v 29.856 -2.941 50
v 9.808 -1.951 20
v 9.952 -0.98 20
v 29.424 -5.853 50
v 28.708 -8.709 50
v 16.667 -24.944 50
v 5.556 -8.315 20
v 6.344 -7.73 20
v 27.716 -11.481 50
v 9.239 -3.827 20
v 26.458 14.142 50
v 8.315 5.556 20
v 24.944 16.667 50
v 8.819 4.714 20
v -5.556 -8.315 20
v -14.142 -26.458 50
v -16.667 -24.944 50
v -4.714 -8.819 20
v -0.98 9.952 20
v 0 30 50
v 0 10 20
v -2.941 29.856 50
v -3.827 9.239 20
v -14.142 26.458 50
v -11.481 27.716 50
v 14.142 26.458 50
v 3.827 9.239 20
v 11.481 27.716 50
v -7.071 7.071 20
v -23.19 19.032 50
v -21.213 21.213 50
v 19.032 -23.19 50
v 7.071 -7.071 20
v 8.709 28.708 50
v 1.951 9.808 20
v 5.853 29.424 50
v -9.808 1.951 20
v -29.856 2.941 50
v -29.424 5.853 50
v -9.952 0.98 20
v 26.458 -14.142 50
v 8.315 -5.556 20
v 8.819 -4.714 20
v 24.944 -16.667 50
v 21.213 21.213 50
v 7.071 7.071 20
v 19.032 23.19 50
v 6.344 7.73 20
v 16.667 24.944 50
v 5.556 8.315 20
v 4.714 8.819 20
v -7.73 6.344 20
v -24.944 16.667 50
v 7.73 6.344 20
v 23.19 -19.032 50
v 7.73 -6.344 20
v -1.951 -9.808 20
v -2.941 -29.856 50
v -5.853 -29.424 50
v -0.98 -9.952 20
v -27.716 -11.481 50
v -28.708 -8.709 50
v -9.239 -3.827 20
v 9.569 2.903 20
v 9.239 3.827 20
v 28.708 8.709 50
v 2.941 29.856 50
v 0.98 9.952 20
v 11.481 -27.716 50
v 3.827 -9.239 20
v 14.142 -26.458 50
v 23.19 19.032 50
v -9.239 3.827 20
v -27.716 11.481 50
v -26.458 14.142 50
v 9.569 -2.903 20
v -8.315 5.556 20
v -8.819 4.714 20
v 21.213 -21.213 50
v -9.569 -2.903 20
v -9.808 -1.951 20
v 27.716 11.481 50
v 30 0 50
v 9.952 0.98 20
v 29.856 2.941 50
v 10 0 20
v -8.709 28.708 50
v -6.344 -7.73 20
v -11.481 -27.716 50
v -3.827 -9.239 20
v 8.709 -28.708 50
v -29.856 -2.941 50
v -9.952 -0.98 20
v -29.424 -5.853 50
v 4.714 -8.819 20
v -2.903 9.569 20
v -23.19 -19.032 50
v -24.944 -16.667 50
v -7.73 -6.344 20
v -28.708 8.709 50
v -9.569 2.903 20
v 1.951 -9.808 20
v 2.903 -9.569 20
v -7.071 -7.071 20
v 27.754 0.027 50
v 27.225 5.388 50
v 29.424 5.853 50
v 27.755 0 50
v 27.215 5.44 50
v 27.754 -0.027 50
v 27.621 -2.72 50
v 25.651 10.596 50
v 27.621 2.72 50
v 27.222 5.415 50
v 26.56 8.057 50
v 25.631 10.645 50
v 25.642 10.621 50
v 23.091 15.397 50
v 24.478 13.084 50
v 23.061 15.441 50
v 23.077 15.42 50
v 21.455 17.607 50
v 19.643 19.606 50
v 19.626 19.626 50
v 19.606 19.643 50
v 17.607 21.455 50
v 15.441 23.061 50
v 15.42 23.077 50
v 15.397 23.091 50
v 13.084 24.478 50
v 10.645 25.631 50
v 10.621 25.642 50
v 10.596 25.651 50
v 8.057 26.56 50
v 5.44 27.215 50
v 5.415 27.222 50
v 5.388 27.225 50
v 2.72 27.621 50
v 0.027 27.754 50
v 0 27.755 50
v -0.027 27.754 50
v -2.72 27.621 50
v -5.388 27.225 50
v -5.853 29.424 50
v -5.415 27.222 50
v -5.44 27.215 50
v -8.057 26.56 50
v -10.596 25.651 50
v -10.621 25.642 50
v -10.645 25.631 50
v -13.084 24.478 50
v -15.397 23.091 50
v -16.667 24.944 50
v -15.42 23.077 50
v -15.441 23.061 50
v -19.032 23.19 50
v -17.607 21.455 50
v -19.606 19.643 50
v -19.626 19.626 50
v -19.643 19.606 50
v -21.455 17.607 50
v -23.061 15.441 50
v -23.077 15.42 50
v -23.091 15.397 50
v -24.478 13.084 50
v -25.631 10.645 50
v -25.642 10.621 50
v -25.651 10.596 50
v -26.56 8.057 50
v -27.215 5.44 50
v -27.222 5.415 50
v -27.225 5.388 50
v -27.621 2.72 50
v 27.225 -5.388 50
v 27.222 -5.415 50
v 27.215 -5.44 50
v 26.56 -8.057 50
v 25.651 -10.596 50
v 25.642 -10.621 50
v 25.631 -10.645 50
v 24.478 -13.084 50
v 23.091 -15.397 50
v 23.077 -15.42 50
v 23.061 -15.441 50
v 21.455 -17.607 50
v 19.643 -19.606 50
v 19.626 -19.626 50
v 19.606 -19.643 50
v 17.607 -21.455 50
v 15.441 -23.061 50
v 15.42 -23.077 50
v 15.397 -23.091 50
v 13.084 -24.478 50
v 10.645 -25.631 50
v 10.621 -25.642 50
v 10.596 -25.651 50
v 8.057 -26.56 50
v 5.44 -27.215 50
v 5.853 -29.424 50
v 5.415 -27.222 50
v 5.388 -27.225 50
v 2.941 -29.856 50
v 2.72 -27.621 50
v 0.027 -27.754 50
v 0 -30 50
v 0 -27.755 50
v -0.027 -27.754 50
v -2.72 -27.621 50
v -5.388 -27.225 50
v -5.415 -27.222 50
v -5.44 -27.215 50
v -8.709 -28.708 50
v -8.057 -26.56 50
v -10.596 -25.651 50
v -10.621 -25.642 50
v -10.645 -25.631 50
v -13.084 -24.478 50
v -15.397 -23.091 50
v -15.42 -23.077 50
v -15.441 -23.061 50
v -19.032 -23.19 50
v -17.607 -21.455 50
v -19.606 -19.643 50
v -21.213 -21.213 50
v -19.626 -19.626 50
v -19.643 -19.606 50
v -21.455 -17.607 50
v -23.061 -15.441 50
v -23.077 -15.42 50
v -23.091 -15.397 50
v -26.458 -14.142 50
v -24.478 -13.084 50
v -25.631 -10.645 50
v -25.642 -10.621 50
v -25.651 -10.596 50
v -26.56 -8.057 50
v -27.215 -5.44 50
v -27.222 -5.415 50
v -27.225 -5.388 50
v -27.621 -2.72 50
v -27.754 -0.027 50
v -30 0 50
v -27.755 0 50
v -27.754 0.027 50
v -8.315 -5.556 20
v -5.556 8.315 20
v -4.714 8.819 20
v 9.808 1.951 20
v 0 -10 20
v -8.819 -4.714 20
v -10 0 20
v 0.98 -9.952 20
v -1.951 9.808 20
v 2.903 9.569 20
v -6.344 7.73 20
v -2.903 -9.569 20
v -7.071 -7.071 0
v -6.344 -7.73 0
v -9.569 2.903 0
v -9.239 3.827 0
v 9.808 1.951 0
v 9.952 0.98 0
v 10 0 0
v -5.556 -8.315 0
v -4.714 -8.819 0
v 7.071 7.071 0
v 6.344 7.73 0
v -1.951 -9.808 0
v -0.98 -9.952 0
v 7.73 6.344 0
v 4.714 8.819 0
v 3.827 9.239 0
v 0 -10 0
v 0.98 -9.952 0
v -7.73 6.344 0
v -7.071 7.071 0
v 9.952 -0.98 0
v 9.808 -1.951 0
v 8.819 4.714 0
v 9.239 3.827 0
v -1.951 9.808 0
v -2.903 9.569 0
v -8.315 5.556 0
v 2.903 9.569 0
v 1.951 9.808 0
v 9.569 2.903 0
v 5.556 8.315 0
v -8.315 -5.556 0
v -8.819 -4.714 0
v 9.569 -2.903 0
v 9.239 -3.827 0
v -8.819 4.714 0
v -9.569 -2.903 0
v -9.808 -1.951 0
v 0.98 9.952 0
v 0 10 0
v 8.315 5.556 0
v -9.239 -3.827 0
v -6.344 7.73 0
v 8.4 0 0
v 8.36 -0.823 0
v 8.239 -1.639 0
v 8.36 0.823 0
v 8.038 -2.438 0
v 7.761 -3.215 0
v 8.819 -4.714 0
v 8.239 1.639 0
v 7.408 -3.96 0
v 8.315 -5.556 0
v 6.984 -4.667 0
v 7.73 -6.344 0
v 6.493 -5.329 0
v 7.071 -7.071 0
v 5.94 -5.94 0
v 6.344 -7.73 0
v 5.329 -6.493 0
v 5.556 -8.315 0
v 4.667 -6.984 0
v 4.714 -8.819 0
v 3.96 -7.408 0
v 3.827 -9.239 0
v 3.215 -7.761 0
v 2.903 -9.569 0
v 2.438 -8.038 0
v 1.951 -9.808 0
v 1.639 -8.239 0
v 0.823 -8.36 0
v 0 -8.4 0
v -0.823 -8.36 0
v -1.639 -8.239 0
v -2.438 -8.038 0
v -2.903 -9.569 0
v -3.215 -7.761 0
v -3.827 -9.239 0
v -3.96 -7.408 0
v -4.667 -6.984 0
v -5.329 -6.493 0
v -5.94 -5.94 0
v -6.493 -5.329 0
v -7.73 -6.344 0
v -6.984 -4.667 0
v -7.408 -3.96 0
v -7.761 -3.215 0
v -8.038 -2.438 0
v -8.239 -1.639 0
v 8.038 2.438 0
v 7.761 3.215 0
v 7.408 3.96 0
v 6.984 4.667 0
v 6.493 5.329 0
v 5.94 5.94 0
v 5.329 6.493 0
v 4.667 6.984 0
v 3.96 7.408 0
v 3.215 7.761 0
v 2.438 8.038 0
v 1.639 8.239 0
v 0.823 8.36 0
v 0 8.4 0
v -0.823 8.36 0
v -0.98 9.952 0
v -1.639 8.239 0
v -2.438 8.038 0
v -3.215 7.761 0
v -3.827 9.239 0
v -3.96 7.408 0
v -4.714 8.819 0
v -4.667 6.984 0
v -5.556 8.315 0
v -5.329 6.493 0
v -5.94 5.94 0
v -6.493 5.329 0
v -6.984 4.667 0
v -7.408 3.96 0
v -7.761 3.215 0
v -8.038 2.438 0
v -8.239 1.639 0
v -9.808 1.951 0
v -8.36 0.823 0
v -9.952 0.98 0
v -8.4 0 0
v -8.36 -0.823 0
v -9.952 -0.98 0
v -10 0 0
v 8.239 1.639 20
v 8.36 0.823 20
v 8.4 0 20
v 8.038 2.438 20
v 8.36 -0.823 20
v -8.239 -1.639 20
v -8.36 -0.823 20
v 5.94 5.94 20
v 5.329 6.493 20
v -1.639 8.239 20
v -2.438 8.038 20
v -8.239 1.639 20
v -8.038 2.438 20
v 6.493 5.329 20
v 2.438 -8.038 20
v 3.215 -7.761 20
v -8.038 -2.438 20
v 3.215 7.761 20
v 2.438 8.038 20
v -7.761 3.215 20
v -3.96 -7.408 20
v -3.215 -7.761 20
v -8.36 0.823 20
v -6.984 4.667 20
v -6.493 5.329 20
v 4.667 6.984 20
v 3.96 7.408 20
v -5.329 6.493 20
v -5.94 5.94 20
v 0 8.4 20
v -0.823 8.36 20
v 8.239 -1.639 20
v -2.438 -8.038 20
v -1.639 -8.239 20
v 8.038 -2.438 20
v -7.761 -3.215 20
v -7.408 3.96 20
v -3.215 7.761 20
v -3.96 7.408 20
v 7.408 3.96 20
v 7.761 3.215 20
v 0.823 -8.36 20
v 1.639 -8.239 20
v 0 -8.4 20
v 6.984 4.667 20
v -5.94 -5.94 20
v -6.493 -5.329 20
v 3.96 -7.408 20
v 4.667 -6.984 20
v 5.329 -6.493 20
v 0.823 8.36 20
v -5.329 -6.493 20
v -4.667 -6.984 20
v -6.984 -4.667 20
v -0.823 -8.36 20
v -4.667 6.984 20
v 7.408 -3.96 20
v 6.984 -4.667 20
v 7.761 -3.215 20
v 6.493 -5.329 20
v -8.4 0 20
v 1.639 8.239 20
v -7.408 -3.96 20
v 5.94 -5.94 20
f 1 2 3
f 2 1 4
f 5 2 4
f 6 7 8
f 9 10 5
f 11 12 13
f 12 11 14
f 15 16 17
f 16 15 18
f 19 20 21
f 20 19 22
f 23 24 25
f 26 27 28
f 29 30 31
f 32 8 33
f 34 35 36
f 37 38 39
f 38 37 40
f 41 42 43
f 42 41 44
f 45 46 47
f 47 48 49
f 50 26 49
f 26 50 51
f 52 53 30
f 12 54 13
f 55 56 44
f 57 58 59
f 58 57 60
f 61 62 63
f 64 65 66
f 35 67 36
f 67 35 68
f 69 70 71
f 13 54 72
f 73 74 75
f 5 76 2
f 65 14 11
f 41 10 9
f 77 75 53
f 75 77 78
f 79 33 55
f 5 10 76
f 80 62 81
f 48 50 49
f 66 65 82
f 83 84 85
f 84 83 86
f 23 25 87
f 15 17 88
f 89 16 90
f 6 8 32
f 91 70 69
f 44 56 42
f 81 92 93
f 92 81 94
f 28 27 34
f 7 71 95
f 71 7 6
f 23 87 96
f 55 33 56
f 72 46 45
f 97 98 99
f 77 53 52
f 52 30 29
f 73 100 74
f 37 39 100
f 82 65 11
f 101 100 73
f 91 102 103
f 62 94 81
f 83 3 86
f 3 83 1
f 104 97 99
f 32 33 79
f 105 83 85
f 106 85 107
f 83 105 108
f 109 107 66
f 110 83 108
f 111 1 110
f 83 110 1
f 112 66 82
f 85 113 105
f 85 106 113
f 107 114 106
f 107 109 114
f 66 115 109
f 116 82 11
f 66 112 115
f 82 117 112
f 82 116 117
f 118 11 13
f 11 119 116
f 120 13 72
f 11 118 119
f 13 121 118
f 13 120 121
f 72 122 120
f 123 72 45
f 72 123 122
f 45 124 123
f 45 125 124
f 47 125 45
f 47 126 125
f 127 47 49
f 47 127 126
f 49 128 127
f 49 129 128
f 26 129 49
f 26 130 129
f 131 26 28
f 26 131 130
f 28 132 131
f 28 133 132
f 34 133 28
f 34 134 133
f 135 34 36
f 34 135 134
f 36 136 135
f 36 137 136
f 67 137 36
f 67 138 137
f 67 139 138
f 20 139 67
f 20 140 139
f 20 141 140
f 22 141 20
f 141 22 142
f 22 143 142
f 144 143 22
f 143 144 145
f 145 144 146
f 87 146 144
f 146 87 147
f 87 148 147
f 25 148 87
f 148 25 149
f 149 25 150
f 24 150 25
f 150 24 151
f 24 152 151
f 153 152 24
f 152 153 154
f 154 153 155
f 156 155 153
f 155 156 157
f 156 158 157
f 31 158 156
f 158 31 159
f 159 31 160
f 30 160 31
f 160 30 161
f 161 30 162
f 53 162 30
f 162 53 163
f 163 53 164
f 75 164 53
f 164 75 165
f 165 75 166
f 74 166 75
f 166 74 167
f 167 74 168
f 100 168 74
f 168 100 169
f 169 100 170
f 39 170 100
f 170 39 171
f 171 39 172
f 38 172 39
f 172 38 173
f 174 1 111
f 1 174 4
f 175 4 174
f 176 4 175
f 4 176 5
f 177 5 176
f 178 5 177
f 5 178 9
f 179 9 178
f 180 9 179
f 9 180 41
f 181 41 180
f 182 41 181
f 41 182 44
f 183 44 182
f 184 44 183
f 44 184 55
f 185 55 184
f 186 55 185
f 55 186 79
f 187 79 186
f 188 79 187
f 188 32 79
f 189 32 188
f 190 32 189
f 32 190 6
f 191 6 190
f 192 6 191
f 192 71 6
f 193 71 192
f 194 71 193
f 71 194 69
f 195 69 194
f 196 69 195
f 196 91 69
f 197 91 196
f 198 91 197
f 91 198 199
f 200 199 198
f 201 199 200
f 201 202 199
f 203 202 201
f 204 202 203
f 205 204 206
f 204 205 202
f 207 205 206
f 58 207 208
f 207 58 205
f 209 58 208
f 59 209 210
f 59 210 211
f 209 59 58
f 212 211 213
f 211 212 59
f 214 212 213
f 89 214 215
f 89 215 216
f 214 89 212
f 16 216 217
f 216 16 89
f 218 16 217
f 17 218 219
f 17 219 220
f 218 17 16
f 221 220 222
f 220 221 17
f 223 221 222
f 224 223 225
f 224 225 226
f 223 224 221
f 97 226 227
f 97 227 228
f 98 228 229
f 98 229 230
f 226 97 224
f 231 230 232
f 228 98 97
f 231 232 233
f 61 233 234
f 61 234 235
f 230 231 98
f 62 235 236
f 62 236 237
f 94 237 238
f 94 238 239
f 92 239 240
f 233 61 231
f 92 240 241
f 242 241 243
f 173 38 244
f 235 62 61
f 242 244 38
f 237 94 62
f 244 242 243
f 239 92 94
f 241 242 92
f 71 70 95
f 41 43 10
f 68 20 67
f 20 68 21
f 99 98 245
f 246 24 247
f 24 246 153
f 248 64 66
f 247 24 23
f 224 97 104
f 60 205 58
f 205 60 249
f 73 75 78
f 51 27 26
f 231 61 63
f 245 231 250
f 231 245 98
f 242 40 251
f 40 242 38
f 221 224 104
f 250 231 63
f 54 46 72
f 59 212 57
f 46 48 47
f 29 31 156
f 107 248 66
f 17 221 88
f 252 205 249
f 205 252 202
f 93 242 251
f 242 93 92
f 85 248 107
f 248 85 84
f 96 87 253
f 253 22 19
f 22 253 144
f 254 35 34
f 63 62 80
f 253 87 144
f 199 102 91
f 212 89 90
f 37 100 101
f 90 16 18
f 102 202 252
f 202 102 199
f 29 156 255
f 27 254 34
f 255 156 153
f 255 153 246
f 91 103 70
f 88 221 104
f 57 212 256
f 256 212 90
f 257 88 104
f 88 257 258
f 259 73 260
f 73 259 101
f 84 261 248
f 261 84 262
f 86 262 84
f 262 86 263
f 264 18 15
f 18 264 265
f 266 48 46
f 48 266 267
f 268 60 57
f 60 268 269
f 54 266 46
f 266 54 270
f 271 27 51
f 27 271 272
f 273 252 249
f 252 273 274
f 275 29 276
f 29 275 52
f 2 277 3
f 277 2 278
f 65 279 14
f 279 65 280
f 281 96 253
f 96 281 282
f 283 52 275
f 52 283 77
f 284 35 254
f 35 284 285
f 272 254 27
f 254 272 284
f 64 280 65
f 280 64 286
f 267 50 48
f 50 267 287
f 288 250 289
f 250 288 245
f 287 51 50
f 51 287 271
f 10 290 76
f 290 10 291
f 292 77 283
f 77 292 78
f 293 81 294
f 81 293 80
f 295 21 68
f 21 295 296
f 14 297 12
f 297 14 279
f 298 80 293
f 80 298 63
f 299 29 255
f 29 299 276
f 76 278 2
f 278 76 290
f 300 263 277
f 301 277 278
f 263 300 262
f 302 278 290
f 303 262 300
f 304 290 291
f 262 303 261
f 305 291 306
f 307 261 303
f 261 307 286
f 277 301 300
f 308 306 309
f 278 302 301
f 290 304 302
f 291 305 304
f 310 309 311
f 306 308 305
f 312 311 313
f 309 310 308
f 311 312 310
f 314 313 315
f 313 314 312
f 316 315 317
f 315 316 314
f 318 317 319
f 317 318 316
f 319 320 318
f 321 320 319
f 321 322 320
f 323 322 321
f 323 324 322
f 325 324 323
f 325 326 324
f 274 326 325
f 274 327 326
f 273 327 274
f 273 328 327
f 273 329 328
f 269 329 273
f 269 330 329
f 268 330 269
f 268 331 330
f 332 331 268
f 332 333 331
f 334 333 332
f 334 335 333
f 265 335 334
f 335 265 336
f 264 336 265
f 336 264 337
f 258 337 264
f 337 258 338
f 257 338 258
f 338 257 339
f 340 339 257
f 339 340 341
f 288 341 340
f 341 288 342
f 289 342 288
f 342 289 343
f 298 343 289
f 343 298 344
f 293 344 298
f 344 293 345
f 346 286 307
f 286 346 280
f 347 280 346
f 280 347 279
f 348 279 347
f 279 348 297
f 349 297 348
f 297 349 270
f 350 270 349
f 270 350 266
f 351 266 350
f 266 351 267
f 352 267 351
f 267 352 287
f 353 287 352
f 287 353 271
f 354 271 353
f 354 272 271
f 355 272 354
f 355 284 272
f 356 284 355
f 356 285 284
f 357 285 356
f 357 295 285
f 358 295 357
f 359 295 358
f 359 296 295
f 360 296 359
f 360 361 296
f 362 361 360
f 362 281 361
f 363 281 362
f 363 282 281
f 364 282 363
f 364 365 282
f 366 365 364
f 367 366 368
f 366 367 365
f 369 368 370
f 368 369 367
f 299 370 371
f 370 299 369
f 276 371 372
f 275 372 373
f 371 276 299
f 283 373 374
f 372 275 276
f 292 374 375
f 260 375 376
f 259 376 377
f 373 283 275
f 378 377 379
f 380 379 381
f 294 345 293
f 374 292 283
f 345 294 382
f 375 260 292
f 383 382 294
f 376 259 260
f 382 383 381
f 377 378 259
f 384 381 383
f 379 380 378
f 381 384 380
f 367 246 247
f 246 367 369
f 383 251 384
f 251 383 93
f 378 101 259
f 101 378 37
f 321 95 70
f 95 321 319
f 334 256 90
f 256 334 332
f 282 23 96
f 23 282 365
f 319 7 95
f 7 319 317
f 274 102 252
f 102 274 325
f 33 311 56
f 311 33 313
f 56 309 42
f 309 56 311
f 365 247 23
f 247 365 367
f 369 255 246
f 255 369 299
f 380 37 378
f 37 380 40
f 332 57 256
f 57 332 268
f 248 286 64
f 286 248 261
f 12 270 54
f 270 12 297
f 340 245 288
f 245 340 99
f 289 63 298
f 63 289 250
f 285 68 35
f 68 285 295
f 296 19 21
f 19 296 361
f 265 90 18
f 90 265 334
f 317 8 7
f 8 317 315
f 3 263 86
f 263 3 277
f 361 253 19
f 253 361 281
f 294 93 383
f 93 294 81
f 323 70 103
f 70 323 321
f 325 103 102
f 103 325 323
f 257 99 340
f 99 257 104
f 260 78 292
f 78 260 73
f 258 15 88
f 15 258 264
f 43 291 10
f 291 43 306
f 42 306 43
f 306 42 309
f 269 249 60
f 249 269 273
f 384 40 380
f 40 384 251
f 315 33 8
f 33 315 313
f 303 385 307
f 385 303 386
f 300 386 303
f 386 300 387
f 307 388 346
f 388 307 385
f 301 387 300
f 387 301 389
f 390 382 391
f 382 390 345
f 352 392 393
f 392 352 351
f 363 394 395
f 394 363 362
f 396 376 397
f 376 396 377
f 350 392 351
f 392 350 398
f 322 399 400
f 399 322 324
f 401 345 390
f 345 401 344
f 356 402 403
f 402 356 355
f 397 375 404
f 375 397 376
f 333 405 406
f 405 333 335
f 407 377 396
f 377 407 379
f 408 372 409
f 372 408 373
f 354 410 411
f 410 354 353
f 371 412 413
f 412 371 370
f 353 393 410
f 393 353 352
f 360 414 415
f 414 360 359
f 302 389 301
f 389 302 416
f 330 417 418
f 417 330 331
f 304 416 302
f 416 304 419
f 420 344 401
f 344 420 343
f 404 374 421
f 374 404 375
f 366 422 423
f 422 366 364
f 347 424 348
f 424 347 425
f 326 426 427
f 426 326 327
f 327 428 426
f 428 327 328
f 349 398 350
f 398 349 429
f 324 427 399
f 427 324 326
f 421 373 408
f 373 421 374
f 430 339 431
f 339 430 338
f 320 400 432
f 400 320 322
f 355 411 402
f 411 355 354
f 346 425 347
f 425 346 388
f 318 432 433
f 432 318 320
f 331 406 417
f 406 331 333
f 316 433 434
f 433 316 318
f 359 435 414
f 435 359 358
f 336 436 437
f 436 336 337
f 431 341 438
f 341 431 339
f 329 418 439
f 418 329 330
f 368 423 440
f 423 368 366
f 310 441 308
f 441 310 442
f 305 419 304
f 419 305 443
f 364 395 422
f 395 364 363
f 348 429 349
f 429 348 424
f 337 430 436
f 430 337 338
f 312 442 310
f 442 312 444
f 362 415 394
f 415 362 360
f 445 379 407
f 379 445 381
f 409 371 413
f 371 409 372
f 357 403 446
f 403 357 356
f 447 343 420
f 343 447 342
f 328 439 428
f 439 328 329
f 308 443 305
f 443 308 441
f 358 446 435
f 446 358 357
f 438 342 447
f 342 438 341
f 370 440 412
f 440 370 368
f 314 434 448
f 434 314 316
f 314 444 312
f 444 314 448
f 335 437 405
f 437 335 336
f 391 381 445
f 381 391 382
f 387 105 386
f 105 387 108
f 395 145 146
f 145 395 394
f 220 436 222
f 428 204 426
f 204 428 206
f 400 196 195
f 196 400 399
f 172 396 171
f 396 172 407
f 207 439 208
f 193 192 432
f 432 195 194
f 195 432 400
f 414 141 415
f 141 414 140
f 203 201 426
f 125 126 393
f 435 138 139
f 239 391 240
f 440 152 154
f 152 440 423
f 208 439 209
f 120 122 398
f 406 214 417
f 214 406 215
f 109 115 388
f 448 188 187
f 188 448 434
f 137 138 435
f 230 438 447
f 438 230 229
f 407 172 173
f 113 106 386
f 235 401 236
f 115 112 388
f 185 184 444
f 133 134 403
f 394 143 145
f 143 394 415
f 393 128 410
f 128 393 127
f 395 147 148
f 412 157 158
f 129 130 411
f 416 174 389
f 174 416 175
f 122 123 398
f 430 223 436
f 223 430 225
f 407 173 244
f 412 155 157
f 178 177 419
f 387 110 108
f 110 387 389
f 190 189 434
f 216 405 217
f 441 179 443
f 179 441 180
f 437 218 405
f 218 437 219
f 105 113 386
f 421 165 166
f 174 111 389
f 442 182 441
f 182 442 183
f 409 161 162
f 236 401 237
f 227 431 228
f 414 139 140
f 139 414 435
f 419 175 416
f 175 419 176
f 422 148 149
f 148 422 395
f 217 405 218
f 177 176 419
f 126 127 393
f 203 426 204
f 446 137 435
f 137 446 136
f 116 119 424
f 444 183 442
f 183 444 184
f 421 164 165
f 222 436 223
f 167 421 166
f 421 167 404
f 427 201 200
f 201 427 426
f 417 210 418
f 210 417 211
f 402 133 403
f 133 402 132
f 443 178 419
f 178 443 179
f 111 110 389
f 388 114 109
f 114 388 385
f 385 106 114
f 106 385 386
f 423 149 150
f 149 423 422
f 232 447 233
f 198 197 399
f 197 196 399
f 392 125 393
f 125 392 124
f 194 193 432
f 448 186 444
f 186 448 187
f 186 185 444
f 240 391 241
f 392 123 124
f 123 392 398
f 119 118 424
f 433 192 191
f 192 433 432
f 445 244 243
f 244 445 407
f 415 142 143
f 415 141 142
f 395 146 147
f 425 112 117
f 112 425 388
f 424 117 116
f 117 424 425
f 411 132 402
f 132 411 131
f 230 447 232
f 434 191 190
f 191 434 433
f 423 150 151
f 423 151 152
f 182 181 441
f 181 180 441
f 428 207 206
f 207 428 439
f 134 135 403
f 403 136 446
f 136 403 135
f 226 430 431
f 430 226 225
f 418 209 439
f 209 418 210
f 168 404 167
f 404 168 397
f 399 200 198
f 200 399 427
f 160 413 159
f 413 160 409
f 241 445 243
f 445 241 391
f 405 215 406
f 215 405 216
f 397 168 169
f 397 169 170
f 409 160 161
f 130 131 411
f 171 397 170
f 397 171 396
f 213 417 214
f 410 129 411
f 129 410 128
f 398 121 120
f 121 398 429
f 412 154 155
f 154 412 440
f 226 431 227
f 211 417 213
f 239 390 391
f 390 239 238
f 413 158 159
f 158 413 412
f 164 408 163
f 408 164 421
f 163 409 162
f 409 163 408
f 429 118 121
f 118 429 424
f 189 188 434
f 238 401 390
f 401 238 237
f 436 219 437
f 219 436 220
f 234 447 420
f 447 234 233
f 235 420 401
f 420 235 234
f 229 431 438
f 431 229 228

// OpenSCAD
// Funnel - a conical mouth narrowing into a straight spout, hollow with a constant wall. NOVEL
// general part (a generic funnel, not any one labware item).
//
// @desc hollow funnel: conical mouth into a straight spout
// @prompt Design a funnel in OpenSCAD: a cone {top} mm across the mouth narrowing over {cone_h} mm to a spout {spout_d} mm across and {spout_l} mm long, with a {wall} mm wall throughout. Reply with a single complete OpenSCAD file.
// @param top     mouth diameter, mm   [30:90]
// @param spout_d spout diameter, mm   [6:20]
// @param cone_h  cone height, mm      [20:60]
// @param spout_l spout length, mm     [10:40]
// @param wall    wall thickness, mm   [1.2:3]

top     = 60;
spout_d = 20;
cone_h  = 30;
spout_l = 20;
wall    = 1.6;

$fn = 64;

ib = max(1.6, spout_d - 2 * wall);   // keep the spout bore open even if the wall is thick

translate([0, 0, spout_l])          // rest the spout tip on the bed (z = 0)
difference() {
    union() {
        cylinder(h = cone_h, d1 = spout_d, d2 = top);                 // cone: spout end up to mouth
        translate([0, 0, -spout_l]) cylinder(h = spout_l + 0.01, d = spout_d);   // spout below
    }
    translate([0, 0, -spout_l - 1])
        cylinder(h = spout_l + 1 + 0.01, d = ib);                     // bore through the spout
    cylinder(h = cone_h + 1, d1 = ib, d2 = top - 2 * wall);           // inner cone, open mouth
}
